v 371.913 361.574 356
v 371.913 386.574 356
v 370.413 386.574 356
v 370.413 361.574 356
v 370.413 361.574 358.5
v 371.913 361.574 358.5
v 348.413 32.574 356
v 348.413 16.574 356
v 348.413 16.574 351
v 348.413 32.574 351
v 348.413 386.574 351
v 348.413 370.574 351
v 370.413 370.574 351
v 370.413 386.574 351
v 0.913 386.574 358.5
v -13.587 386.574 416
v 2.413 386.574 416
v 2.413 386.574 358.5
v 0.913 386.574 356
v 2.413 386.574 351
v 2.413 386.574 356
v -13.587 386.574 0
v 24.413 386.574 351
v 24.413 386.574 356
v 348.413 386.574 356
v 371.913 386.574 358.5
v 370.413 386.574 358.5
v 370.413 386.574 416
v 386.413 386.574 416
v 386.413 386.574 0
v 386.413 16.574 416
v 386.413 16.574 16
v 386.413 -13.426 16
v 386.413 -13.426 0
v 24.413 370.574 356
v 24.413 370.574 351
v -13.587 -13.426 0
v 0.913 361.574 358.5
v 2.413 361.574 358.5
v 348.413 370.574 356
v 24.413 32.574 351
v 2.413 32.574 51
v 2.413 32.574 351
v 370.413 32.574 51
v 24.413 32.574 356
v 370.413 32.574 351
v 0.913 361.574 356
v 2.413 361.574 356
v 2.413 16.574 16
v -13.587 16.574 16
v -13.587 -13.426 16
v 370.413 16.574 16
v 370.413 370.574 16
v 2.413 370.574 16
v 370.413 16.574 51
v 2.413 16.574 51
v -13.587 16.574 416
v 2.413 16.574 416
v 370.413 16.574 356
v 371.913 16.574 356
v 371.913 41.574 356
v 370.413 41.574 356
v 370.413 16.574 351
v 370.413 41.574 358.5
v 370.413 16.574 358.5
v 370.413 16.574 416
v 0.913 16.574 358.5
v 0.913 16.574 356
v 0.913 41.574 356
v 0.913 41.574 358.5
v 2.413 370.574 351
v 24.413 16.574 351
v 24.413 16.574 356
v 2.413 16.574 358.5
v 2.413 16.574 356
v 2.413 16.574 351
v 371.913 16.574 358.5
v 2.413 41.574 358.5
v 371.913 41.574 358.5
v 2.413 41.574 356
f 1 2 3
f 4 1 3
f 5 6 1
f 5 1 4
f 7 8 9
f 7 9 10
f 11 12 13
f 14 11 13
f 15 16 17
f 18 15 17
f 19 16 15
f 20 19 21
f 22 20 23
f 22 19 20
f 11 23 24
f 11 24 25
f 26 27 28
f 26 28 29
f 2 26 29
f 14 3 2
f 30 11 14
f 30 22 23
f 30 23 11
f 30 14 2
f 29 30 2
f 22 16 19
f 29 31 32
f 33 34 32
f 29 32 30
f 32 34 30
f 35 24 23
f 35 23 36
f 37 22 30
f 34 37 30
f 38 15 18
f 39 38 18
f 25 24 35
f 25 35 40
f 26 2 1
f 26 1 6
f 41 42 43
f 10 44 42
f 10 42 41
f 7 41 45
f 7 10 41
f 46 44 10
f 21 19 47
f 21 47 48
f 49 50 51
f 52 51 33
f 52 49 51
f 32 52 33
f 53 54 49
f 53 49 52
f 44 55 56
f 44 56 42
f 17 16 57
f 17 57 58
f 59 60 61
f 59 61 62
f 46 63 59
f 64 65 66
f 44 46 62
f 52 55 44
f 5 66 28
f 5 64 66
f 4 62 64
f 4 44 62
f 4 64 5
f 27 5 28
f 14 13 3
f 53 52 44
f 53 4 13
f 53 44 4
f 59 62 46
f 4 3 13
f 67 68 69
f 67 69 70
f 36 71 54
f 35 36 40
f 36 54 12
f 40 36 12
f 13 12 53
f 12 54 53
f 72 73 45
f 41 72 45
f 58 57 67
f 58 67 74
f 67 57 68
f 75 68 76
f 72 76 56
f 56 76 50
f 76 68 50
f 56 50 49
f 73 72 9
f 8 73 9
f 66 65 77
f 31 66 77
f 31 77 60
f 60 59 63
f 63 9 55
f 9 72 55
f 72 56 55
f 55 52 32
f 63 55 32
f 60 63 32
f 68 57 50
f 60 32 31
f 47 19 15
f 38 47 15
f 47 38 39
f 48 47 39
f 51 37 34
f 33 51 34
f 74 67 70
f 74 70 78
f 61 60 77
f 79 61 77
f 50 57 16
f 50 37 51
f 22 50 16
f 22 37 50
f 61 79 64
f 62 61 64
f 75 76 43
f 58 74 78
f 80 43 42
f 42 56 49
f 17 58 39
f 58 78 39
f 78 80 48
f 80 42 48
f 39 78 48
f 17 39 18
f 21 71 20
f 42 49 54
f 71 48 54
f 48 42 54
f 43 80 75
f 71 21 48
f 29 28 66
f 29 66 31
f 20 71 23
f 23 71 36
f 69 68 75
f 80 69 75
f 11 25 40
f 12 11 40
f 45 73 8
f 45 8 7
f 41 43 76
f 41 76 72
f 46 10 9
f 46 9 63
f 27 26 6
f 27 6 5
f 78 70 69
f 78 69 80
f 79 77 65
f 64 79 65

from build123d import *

# Parameters (mm, degrees)
SKETCH_1_W               = 400
SKETCH_1_H               = 400
EXTRUDE_1_DEPTH          = 16
SKETCH_2_W               = 16
SKETCH_2_H               = 370
EXTRUDE_2_DEPTH          = 400
SKETCH_3_W               = 16
SKETCH_3_H               = 370
EXTRUDE_3_DEPTH          = 400
SKETCH_4_W               = 368
SKETCH_4_H               = 16
EXTRUDE_4_DEPTH          = 340
EXTRUDE_5_REACH          = 687.53
SKETCH_6_W               = 305
SKETCH_6_H               = 16
SKETCH_7_W               = 22
SKETCH_7_H               = 16
CUT_EXTRUDE_1_DEPTH      = 5
SKETCH_14_W              = 22
SKETCH_14_H              = 16
CUT_EXTRUDE_2_DEPTH      = 5
SKETCH_15_W              = 1.5
SKETCH_15_H              = 2.5
CUT_EXTRUDE_3_DEPTH      = 25
MIRROR_4_COPY_1_SKETCH_W = 1.5
MIRROR_4_COPY_1_SKETCH_H = 2.5
MIRROR_4_COPY_1_DEPTH    = 25
MIRROR_4_COPY_2_SKETCH_W = 1.5
MIRROR_4_COPY_2_SKETCH_H = 2.5
MIRROR_4_COPY_2_DEPTH    = 25
MIRROR_4_COPY_3_SKETCH_W = 1.5
MIRROR_4_COPY_3_SKETCH_H = 2.5
MIRROR_4_COPY_3_DEPTH    = 25
MIRROR_4_COPY_4_SKETCH_W = 1.5
MIRROR_4_COPY_4_SKETCH_H = 2.5
MIRROR_4_COPY_4_DEPTH    = 25


with BuildPart() as part:
    # 草图1 → 凸台-拉伸1 (new body)
    with BuildSketch(Plane.XY):
        with Locations((186.413251901, 186.573625287)):
            Rectangle(SKETCH_1_W, SKETCH_1_H)
    extrude(amount=EXTRUDE_1_DEPTH)

    # 草图2 → 凸台-拉伸2 (add)
    with BuildSketch(Plane.XY.offset(16)):
        with Locations((-5.586748099, 201.573625287)):
            Rectangle(SKETCH_2_W, SKETCH_2_H)
    extrude(amount=EXTRUDE_2_DEPTH)

    # 草图3 → 凸台-拉伸3 (add)
    with BuildSketch(Plane.XY.offset(16)):
        with Locations((378.413251901, 201.573625287)):
            Rectangle(SKETCH_3_W, SKETCH_3_H)
    extrude(amount=EXTRUDE_3_DEPTH)

    # 草图4 → 凸台-拉伸4 (add)
    with BuildSketch(Plane.XY.offset(16)):
        with Locations((186.413251901, 378.573625287)):
            Rectangle(SKETCH_4_W, SKETCH_4_H)
    extrude(amount=EXTRUDE_4_DEPTH)

    # 草图6 → 凸台-拉伸5 (add, up to next)
    with BuildSketch(Plane.ZY.offset(-370.413251901), mode=Mode.PRIVATE) as extrude_5_sk1:
        with Locations((203.5, 24.573625287)):
            Rectangle(SKETCH_6_W, SKETCH_6_H)
    extrude_5_tool1 = extrude(extrude_5_sk1.sketch, amount=EXTRUDE_5_REACH, mode=Mode.PRIVATE) - part.part
    add(extrude_5_tool1.solids().sort_by_distance((370.413252, 24.573625, 203.5))[0])

    # 草图7 → 切除-拉伸1 (cut)
    with BuildSketch(Plane.XY.offset(356)):
        with Locations((359.413251901, 24.573625287)):
            Rectangle(SKETCH_7_W, SKETCH_7_H)
    cut_extrude_1 = extrude(amount=-CUT_EXTRUDE_1_DEPTH, mode=Mode.SUBTRACT)

    # 草图14 → 切除-拉伸2 (cut)
    with BuildSketch(Plane.XY.offset(356)):
        with Locations((13.413251901, 24.573625287)):
            Rectangle(SKETCH_14_W, SKETCH_14_H)
    cut_extrude_2 = extrude(amount=-CUT_EXTRUDE_2_DEPTH, mode=Mode.SUBTRACT)

    # 镜向1: 切除-拉伸1, 切除-拉伸2 across plane
    add(cut_extrude_1.mirror(Plane(origin=(0, 201.573625287, 0), x_dir=(0, 0, 1), z_dir=(0, -1, 0))), mode=Mode.SUBTRACT)
    add(cut_extrude_2.mirror(Plane(origin=(0, 201.573625287, 0), x_dir=(0, 0, 1), z_dir=(0, -1, 0))), mode=Mode.SUBTRACT)

    # 草图15 → 切除-拉伸3 (cut)
    with BuildSketch(Plane.XZ.offset(-16.573625287)):
        with Locations((1.663251901, 357.25)):
            Rectangle(SKETCH_15_W, SKETCH_15_H)
    cut_extrude_3 = extrude(amount=-CUT_EXTRUDE_3_DEPTH, mode=Mode.SUBTRACT)

    # 镜向2: 切除-拉伸3 across plane
    add(cut_extrude_3.mirror(Plane(origin=(0, 201.573625287, 0), x_dir=(0, 0, 1), z_dir=(0, -1, 0))), mode=Mode.SUBTRACT)

    # 镜向3: 切除-拉伸3 across plane
    add(cut_extrude_3.mirror(Plane(origin=(186.413251901, 0, 0), x_dir=(0, 0, 1), z_dir=(1, 0, 0))), mode=Mode.SUBTRACT)

    # 镜向4 copy 1 sketch → 镜向4 copy 1 (cut)
    with BuildSketch(Plane.XZ.offset(-16.573625287)):
        with Locations((1.663251901, 357.25)):
            Rectangle(MIRROR_4_COPY_1_SKETCH_W, MIRROR_4_COPY_1_SKETCH_H)
    extrude(amount=-MIRROR_4_COPY_1_DEPTH, mode=Mode.SUBTRACT)

    # 镜向4 copy 2 sketch → 镜向4 copy 2 (cut)
    with BuildSketch(Plane(origin=(0, 386.573625287, 0), x_dir=(1, 0, 0), z_dir=(0, 1, 0))):
        with Locations((1.663251901, -357.25)):
            Rectangle(MIRROR_4_COPY_2_SKETCH_W, MIRROR_4_COPY_2_SKETCH_H)
    extrude(amount=-MIRROR_4_COPY_2_DEPTH, mode=Mode.SUBTRACT)

    # 镜向4 copy 3 sketch → 镜向4 copy 3 (cut)
    with BuildSketch(Plane(origin=(372.826503801, 386.573625287, 0), x_dir=(-1, 0, 0), z_dir=(0, 1, 0))):
        with Locations((1.663251901, 357.25)):
            Rectangle(MIRROR_4_COPY_3_SKETCH_W, MIRROR_4_COPY_3_SKETCH_H)
    extrude(amount=-MIRROR_4_COPY_3_DEPTH, mode=Mode.SUBTRACT)

    # 镜向4 copy 4 sketch → 镜向4 copy 4 (cut)
    with BuildSketch(Plane(origin=(0, 386.573625287, 0), x_dir=(1, 0, 0), z_dir=(0, 1, 0))):
        with Locations((1.663251901, -357.25)):
            Rectangle(MIRROR_4_COPY_4_SKETCH_W, MIRROR_4_COPY_4_SKETCH_H)
    extrude(amount=-MIRROR_4_COPY_4_DEPTH, mode=Mode.SUBTRACT)


solid = part.part
